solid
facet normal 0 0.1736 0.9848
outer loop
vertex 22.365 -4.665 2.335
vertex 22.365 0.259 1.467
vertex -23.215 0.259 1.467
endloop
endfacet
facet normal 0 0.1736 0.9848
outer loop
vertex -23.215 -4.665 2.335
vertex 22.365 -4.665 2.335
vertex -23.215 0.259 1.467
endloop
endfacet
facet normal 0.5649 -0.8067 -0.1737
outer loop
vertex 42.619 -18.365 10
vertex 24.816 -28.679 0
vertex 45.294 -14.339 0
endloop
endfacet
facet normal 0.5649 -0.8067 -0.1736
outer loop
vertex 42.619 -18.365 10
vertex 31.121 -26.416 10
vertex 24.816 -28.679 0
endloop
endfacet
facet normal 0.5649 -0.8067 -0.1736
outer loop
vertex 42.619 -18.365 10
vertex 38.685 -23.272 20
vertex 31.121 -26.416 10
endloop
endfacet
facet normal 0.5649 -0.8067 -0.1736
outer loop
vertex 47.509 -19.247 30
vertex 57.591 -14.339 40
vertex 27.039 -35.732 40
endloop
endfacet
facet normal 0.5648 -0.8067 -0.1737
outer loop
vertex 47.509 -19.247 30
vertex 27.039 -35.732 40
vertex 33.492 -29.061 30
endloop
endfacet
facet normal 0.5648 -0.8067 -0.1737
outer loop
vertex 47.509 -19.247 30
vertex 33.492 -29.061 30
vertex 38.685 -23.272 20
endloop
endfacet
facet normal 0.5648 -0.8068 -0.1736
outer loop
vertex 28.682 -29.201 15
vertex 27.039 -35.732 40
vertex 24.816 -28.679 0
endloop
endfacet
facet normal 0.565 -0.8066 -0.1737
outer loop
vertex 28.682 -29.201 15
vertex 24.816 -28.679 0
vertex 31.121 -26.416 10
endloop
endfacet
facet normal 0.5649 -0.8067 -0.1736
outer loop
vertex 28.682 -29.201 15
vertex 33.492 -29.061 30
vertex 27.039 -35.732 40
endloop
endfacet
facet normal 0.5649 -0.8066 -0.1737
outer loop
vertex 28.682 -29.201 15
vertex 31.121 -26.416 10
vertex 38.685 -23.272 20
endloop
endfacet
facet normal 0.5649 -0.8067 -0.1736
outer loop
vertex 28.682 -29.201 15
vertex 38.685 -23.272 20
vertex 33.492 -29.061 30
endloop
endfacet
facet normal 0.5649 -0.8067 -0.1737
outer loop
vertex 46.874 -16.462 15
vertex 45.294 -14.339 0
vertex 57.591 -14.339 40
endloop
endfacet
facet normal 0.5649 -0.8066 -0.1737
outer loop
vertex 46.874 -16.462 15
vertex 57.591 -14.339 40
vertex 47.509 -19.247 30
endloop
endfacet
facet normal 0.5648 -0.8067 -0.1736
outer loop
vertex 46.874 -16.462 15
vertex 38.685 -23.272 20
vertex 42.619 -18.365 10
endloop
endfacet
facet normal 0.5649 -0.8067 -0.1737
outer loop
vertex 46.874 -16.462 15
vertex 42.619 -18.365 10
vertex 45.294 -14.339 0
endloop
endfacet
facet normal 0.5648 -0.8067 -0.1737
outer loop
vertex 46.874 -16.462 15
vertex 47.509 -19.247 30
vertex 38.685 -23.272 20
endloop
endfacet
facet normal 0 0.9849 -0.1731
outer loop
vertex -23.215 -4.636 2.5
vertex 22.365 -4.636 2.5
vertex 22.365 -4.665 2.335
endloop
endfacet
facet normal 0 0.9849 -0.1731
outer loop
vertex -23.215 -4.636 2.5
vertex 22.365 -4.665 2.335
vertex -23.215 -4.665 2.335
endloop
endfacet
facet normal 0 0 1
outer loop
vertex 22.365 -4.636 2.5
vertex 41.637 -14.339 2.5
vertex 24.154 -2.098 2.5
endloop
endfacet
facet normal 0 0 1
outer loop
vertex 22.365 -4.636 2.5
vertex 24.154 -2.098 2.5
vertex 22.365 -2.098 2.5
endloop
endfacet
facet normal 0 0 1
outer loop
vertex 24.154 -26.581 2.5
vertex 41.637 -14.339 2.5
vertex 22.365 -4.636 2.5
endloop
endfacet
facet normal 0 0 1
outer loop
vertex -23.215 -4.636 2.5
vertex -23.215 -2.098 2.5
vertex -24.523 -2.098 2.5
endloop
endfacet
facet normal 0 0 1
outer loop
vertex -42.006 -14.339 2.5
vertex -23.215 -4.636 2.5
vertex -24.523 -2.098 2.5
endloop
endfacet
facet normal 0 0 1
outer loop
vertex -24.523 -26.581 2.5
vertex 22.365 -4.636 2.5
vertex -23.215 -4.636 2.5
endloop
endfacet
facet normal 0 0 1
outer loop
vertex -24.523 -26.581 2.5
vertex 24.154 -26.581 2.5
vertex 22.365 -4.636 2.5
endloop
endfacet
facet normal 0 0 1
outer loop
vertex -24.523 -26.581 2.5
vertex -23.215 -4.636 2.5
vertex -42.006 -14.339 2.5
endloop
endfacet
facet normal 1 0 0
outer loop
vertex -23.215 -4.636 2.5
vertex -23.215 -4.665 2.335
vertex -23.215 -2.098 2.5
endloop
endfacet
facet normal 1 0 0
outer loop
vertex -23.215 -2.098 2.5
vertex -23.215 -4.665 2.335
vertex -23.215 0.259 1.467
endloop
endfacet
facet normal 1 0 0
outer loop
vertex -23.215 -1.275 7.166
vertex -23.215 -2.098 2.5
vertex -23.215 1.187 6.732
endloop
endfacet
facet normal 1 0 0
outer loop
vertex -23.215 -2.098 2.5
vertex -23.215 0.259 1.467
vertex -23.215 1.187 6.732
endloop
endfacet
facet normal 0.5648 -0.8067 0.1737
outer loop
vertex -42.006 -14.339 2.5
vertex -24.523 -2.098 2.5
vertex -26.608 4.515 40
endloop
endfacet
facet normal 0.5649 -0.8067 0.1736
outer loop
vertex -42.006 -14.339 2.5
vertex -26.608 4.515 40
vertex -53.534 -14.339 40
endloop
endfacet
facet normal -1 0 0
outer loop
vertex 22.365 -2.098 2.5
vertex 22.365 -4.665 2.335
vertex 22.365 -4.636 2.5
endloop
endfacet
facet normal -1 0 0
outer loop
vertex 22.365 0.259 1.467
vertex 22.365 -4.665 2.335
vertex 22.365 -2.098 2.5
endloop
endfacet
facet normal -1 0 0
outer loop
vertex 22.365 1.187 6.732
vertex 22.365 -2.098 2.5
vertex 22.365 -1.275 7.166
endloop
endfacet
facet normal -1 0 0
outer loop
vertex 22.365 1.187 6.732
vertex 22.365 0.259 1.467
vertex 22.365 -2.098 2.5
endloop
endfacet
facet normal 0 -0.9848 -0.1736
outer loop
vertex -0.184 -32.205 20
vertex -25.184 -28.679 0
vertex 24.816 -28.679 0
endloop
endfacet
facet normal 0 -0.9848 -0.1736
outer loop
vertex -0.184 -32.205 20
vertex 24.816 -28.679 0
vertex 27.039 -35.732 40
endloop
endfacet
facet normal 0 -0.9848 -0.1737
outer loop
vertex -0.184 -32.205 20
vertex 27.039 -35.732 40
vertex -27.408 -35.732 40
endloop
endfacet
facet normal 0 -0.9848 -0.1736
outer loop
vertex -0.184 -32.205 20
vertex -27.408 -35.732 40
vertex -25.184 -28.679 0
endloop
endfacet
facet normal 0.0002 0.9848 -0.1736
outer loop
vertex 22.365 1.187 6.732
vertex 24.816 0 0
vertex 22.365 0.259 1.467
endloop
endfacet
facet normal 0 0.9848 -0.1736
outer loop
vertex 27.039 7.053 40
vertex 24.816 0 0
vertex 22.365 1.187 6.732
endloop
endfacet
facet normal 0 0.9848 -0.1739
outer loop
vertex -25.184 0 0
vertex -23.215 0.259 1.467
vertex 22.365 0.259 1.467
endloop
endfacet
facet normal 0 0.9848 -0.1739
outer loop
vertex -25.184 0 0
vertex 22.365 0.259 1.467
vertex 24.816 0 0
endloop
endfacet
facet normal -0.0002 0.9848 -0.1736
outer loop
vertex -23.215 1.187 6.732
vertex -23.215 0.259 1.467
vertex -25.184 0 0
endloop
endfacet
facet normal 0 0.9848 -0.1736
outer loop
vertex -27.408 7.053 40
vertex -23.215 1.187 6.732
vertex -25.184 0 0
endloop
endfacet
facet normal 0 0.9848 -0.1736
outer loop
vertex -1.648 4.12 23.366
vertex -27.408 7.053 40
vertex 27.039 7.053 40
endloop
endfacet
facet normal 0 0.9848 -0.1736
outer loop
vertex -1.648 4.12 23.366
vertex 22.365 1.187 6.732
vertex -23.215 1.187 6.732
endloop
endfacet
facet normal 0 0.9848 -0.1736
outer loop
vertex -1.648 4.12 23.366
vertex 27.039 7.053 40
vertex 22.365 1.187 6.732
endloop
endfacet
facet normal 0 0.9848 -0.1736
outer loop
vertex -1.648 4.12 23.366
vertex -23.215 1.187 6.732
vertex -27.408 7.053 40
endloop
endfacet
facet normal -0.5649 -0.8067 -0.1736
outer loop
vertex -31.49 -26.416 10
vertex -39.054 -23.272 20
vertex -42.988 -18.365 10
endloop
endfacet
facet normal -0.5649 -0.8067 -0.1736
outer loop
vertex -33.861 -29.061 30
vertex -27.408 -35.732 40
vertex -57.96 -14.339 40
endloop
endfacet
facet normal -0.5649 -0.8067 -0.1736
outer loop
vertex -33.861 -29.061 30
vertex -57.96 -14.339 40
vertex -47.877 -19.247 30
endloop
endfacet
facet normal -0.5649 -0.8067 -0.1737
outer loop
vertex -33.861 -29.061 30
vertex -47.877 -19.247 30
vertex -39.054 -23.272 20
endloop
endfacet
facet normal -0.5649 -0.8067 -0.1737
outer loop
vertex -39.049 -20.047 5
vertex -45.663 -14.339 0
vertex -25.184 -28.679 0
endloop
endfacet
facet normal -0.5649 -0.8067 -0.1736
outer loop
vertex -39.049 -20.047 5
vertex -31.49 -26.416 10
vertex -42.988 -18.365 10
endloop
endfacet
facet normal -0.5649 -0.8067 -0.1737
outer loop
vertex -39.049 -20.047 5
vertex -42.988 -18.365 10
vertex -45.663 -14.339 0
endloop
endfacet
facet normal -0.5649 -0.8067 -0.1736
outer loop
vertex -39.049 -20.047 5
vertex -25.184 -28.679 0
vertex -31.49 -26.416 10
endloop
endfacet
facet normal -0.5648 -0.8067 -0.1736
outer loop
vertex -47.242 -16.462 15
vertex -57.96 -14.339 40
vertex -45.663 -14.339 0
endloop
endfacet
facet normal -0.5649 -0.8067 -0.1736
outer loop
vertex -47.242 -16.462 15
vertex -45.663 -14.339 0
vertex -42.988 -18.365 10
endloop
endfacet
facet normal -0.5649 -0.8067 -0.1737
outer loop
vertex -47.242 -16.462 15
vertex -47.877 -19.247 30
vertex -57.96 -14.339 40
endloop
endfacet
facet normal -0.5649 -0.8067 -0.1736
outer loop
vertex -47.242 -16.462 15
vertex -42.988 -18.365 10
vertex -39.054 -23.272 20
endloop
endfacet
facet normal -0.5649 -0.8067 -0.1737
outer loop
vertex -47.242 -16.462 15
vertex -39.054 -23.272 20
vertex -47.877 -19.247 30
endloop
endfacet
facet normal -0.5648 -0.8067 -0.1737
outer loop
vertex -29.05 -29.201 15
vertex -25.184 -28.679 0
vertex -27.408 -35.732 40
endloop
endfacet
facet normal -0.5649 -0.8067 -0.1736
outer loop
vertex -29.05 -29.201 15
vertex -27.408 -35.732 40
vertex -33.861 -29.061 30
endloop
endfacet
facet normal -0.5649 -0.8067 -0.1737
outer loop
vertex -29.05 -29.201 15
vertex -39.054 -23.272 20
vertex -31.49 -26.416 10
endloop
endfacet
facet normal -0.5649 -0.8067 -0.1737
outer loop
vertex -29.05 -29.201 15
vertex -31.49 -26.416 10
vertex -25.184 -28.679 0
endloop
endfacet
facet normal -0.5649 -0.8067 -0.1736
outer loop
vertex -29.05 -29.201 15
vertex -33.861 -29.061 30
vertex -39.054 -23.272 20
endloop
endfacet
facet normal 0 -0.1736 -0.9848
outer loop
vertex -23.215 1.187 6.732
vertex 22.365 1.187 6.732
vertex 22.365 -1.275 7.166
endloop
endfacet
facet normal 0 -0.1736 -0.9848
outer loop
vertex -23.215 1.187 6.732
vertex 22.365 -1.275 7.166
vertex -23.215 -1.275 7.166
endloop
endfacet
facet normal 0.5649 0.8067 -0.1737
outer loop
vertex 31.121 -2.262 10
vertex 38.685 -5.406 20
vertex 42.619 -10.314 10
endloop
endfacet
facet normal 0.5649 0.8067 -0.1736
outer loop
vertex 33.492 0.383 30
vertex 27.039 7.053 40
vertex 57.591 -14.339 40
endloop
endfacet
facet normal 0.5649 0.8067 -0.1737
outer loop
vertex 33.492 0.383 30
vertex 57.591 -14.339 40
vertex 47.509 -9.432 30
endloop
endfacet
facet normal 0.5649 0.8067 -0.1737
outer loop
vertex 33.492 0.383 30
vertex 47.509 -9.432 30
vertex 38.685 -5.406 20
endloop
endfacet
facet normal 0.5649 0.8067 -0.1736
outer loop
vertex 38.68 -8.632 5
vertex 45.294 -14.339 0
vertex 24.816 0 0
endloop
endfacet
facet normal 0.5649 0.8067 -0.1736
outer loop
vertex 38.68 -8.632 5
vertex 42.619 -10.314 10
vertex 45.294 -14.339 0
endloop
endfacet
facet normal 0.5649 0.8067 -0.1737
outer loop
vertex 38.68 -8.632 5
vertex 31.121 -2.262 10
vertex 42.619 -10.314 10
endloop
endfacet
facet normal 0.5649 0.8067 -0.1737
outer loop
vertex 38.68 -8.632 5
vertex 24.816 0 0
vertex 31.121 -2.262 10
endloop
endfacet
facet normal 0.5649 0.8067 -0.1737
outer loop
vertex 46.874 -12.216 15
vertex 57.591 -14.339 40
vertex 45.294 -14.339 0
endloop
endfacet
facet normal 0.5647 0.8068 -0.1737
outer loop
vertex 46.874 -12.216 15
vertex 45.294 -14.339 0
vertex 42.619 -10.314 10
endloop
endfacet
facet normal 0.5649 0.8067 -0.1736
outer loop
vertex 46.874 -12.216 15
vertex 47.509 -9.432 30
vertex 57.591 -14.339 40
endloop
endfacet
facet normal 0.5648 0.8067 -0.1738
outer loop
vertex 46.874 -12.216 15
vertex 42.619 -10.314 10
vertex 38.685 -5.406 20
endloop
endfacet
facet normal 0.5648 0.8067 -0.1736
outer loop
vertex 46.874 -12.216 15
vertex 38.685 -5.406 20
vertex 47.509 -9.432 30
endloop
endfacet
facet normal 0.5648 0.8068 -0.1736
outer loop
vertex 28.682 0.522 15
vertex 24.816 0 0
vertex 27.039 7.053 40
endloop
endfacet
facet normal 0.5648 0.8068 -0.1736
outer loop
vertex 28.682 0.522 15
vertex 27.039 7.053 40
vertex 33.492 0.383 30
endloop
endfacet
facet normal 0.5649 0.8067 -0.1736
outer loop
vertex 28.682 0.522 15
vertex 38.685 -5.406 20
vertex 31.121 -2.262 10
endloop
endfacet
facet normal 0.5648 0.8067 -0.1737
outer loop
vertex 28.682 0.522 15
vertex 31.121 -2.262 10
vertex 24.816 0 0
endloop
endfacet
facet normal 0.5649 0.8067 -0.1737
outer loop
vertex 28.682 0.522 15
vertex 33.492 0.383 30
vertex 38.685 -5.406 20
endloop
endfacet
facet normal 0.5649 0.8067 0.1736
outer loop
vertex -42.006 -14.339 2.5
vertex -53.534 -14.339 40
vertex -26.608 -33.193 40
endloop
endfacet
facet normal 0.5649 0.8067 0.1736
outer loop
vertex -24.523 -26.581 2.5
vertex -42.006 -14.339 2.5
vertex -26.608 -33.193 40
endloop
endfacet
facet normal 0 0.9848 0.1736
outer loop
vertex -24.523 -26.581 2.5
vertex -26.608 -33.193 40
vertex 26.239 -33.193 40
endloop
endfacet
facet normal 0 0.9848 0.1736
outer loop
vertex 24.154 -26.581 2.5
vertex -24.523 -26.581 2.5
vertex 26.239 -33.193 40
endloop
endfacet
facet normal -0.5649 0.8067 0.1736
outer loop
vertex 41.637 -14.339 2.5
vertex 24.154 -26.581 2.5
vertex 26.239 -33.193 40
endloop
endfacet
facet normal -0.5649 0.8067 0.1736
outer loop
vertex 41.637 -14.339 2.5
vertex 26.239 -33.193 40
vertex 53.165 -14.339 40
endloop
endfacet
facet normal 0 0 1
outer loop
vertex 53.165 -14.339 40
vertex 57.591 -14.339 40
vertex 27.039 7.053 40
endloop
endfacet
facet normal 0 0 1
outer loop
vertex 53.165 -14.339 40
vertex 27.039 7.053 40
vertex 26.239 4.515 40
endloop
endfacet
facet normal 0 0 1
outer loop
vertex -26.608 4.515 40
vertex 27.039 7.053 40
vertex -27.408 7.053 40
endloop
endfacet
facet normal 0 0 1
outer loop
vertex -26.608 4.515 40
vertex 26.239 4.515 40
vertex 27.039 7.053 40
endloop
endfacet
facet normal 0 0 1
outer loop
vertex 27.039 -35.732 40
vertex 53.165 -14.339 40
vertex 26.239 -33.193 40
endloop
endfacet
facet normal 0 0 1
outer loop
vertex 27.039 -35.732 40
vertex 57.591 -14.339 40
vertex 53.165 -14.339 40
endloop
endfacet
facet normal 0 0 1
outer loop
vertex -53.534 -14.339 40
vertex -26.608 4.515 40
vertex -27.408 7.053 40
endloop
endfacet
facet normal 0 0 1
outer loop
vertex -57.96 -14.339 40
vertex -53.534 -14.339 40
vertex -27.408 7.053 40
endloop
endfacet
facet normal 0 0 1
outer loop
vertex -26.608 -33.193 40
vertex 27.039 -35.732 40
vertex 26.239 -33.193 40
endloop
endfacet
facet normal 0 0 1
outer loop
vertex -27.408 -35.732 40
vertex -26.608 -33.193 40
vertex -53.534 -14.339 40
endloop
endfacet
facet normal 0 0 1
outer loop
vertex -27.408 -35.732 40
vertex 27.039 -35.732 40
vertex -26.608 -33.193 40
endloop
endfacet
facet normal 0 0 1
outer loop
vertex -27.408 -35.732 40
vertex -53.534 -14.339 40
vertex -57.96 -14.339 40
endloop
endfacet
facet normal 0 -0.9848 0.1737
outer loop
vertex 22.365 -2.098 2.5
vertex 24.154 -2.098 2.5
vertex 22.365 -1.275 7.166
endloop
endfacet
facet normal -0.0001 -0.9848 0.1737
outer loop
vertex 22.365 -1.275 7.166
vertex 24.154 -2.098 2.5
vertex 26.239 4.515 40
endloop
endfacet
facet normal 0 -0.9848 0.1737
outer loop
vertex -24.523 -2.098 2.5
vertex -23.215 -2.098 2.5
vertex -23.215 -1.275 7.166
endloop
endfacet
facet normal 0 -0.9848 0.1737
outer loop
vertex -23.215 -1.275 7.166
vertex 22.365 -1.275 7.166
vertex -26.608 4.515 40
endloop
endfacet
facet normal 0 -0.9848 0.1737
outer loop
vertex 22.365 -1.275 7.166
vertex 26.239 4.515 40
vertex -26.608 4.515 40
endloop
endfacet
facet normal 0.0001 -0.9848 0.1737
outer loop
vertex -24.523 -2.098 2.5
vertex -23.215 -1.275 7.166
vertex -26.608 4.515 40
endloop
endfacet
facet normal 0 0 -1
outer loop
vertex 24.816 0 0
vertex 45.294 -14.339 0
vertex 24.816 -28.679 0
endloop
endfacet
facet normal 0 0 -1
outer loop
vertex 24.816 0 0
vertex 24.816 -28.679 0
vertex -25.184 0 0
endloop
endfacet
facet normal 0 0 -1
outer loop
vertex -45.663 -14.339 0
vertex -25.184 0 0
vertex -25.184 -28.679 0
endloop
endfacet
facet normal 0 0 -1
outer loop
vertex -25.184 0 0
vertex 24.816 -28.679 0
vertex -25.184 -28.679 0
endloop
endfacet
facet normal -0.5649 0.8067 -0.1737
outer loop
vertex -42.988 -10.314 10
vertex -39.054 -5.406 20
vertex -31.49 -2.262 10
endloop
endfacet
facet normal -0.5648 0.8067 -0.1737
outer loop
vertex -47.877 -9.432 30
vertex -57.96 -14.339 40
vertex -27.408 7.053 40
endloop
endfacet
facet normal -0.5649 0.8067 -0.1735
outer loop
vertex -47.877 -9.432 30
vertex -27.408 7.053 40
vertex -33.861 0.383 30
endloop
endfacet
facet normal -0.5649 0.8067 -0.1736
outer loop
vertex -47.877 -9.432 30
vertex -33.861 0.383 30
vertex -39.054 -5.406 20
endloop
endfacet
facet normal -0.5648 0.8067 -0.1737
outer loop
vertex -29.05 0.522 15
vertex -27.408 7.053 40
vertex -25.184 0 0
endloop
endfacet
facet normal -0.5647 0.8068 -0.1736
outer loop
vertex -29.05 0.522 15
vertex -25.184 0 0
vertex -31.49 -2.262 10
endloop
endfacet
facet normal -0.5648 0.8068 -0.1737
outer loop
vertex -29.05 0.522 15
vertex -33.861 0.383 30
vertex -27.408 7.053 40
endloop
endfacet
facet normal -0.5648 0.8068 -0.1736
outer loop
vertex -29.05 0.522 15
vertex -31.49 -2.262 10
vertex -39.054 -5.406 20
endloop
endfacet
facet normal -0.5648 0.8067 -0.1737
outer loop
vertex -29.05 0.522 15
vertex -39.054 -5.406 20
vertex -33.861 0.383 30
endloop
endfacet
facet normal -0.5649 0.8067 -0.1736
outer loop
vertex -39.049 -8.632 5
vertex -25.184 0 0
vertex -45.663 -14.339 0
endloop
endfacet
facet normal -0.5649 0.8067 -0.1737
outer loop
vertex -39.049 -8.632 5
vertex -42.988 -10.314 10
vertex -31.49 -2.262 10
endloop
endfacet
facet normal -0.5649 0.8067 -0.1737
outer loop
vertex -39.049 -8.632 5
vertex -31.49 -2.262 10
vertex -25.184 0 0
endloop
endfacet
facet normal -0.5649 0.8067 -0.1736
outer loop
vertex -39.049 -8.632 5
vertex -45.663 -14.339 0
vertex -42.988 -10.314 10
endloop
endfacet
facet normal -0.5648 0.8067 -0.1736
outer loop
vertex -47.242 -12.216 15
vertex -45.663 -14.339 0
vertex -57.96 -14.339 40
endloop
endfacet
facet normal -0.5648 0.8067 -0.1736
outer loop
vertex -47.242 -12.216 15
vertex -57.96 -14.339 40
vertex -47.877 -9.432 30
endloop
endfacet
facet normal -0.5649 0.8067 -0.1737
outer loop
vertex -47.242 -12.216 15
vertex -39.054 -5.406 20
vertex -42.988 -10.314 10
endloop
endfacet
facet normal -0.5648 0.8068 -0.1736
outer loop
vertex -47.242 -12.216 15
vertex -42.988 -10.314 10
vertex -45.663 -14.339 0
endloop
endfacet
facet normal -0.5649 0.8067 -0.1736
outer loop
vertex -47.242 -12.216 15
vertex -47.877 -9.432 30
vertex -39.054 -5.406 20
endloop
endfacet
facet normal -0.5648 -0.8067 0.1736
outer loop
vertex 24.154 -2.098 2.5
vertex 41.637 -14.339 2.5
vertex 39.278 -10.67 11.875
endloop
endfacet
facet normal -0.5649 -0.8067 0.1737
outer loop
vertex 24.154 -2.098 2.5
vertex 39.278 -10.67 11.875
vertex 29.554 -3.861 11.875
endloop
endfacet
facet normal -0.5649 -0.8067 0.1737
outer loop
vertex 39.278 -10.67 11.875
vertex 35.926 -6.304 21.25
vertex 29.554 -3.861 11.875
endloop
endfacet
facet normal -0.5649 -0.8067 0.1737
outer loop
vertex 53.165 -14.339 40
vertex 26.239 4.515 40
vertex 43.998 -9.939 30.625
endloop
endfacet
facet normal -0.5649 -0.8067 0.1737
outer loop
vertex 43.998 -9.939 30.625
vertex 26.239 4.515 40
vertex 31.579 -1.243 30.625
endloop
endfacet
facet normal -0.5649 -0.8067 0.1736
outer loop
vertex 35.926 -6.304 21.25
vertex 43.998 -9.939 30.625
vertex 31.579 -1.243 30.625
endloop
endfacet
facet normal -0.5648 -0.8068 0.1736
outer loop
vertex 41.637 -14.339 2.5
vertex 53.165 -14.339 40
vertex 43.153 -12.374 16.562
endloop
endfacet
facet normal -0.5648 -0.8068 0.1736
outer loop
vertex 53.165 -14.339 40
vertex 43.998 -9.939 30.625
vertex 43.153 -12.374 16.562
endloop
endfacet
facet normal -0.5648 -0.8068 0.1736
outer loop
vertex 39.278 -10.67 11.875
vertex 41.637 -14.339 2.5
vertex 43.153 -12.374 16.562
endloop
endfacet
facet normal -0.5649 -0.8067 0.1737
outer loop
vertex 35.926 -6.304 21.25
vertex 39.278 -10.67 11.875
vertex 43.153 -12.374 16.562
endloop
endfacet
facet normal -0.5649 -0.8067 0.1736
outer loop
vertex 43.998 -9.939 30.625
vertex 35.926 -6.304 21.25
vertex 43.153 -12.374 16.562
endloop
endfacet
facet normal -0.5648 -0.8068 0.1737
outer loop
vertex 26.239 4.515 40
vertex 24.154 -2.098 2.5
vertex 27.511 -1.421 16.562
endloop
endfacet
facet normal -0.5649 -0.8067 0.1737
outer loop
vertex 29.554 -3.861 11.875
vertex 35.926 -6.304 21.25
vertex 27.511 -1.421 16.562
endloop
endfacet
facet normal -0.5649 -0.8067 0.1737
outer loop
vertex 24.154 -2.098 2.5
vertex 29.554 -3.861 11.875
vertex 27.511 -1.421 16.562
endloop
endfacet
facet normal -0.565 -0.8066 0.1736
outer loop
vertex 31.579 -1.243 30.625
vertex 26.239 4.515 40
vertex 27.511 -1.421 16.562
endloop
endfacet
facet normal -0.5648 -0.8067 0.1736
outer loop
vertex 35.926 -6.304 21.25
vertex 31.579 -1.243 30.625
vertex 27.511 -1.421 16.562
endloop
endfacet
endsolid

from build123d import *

# Parameters (mm, degrees)
F1_DEPTH = 40
F1_TAPER = -10
F2_T     = -2.5
F3_W     = 45.5802325159
F3_H     = 5.3462651558
F4_DEPTH = 5


with BuildPart() as f1:
    # F0 (on Top) → F1 (new body)
    with BuildSketch(Plane.XY):
        Polygon((24.8156337307, 0), (0, 0), (-25.1843662693, 0), (-45.6631673765, -14.3394109088), (-25.1843662693, -28.6788218176), (24.8156337307, -28.6788218176), (45.294434838, -14.3394109088), align=None)
    extrude(amount=F1_DEPTH, taper=F1_TAPER)

    # F2
    f2_openings = [f1.faces().sort_by_distance(p)[0] for p in [
        (-0.184366, -14.339411, 40),
    ]]
    offset(amount=F2_T, openings=f2_openings)

    # F3 (on face) → F4 (cut)
    with BuildSketch(Plane(origin=(0, 0, 0), x_dir=(-1, 0, 0), z_dir=(0, 0.984807753, -0.1736481777))):
        with Locations((0.4246877506, 4.1624491569)):
            Rectangle(F3_W, F3_H)
    extrude(amount=-F4_DEPTH, mode=Mode.SUBTRACT)


solid = f1.part
